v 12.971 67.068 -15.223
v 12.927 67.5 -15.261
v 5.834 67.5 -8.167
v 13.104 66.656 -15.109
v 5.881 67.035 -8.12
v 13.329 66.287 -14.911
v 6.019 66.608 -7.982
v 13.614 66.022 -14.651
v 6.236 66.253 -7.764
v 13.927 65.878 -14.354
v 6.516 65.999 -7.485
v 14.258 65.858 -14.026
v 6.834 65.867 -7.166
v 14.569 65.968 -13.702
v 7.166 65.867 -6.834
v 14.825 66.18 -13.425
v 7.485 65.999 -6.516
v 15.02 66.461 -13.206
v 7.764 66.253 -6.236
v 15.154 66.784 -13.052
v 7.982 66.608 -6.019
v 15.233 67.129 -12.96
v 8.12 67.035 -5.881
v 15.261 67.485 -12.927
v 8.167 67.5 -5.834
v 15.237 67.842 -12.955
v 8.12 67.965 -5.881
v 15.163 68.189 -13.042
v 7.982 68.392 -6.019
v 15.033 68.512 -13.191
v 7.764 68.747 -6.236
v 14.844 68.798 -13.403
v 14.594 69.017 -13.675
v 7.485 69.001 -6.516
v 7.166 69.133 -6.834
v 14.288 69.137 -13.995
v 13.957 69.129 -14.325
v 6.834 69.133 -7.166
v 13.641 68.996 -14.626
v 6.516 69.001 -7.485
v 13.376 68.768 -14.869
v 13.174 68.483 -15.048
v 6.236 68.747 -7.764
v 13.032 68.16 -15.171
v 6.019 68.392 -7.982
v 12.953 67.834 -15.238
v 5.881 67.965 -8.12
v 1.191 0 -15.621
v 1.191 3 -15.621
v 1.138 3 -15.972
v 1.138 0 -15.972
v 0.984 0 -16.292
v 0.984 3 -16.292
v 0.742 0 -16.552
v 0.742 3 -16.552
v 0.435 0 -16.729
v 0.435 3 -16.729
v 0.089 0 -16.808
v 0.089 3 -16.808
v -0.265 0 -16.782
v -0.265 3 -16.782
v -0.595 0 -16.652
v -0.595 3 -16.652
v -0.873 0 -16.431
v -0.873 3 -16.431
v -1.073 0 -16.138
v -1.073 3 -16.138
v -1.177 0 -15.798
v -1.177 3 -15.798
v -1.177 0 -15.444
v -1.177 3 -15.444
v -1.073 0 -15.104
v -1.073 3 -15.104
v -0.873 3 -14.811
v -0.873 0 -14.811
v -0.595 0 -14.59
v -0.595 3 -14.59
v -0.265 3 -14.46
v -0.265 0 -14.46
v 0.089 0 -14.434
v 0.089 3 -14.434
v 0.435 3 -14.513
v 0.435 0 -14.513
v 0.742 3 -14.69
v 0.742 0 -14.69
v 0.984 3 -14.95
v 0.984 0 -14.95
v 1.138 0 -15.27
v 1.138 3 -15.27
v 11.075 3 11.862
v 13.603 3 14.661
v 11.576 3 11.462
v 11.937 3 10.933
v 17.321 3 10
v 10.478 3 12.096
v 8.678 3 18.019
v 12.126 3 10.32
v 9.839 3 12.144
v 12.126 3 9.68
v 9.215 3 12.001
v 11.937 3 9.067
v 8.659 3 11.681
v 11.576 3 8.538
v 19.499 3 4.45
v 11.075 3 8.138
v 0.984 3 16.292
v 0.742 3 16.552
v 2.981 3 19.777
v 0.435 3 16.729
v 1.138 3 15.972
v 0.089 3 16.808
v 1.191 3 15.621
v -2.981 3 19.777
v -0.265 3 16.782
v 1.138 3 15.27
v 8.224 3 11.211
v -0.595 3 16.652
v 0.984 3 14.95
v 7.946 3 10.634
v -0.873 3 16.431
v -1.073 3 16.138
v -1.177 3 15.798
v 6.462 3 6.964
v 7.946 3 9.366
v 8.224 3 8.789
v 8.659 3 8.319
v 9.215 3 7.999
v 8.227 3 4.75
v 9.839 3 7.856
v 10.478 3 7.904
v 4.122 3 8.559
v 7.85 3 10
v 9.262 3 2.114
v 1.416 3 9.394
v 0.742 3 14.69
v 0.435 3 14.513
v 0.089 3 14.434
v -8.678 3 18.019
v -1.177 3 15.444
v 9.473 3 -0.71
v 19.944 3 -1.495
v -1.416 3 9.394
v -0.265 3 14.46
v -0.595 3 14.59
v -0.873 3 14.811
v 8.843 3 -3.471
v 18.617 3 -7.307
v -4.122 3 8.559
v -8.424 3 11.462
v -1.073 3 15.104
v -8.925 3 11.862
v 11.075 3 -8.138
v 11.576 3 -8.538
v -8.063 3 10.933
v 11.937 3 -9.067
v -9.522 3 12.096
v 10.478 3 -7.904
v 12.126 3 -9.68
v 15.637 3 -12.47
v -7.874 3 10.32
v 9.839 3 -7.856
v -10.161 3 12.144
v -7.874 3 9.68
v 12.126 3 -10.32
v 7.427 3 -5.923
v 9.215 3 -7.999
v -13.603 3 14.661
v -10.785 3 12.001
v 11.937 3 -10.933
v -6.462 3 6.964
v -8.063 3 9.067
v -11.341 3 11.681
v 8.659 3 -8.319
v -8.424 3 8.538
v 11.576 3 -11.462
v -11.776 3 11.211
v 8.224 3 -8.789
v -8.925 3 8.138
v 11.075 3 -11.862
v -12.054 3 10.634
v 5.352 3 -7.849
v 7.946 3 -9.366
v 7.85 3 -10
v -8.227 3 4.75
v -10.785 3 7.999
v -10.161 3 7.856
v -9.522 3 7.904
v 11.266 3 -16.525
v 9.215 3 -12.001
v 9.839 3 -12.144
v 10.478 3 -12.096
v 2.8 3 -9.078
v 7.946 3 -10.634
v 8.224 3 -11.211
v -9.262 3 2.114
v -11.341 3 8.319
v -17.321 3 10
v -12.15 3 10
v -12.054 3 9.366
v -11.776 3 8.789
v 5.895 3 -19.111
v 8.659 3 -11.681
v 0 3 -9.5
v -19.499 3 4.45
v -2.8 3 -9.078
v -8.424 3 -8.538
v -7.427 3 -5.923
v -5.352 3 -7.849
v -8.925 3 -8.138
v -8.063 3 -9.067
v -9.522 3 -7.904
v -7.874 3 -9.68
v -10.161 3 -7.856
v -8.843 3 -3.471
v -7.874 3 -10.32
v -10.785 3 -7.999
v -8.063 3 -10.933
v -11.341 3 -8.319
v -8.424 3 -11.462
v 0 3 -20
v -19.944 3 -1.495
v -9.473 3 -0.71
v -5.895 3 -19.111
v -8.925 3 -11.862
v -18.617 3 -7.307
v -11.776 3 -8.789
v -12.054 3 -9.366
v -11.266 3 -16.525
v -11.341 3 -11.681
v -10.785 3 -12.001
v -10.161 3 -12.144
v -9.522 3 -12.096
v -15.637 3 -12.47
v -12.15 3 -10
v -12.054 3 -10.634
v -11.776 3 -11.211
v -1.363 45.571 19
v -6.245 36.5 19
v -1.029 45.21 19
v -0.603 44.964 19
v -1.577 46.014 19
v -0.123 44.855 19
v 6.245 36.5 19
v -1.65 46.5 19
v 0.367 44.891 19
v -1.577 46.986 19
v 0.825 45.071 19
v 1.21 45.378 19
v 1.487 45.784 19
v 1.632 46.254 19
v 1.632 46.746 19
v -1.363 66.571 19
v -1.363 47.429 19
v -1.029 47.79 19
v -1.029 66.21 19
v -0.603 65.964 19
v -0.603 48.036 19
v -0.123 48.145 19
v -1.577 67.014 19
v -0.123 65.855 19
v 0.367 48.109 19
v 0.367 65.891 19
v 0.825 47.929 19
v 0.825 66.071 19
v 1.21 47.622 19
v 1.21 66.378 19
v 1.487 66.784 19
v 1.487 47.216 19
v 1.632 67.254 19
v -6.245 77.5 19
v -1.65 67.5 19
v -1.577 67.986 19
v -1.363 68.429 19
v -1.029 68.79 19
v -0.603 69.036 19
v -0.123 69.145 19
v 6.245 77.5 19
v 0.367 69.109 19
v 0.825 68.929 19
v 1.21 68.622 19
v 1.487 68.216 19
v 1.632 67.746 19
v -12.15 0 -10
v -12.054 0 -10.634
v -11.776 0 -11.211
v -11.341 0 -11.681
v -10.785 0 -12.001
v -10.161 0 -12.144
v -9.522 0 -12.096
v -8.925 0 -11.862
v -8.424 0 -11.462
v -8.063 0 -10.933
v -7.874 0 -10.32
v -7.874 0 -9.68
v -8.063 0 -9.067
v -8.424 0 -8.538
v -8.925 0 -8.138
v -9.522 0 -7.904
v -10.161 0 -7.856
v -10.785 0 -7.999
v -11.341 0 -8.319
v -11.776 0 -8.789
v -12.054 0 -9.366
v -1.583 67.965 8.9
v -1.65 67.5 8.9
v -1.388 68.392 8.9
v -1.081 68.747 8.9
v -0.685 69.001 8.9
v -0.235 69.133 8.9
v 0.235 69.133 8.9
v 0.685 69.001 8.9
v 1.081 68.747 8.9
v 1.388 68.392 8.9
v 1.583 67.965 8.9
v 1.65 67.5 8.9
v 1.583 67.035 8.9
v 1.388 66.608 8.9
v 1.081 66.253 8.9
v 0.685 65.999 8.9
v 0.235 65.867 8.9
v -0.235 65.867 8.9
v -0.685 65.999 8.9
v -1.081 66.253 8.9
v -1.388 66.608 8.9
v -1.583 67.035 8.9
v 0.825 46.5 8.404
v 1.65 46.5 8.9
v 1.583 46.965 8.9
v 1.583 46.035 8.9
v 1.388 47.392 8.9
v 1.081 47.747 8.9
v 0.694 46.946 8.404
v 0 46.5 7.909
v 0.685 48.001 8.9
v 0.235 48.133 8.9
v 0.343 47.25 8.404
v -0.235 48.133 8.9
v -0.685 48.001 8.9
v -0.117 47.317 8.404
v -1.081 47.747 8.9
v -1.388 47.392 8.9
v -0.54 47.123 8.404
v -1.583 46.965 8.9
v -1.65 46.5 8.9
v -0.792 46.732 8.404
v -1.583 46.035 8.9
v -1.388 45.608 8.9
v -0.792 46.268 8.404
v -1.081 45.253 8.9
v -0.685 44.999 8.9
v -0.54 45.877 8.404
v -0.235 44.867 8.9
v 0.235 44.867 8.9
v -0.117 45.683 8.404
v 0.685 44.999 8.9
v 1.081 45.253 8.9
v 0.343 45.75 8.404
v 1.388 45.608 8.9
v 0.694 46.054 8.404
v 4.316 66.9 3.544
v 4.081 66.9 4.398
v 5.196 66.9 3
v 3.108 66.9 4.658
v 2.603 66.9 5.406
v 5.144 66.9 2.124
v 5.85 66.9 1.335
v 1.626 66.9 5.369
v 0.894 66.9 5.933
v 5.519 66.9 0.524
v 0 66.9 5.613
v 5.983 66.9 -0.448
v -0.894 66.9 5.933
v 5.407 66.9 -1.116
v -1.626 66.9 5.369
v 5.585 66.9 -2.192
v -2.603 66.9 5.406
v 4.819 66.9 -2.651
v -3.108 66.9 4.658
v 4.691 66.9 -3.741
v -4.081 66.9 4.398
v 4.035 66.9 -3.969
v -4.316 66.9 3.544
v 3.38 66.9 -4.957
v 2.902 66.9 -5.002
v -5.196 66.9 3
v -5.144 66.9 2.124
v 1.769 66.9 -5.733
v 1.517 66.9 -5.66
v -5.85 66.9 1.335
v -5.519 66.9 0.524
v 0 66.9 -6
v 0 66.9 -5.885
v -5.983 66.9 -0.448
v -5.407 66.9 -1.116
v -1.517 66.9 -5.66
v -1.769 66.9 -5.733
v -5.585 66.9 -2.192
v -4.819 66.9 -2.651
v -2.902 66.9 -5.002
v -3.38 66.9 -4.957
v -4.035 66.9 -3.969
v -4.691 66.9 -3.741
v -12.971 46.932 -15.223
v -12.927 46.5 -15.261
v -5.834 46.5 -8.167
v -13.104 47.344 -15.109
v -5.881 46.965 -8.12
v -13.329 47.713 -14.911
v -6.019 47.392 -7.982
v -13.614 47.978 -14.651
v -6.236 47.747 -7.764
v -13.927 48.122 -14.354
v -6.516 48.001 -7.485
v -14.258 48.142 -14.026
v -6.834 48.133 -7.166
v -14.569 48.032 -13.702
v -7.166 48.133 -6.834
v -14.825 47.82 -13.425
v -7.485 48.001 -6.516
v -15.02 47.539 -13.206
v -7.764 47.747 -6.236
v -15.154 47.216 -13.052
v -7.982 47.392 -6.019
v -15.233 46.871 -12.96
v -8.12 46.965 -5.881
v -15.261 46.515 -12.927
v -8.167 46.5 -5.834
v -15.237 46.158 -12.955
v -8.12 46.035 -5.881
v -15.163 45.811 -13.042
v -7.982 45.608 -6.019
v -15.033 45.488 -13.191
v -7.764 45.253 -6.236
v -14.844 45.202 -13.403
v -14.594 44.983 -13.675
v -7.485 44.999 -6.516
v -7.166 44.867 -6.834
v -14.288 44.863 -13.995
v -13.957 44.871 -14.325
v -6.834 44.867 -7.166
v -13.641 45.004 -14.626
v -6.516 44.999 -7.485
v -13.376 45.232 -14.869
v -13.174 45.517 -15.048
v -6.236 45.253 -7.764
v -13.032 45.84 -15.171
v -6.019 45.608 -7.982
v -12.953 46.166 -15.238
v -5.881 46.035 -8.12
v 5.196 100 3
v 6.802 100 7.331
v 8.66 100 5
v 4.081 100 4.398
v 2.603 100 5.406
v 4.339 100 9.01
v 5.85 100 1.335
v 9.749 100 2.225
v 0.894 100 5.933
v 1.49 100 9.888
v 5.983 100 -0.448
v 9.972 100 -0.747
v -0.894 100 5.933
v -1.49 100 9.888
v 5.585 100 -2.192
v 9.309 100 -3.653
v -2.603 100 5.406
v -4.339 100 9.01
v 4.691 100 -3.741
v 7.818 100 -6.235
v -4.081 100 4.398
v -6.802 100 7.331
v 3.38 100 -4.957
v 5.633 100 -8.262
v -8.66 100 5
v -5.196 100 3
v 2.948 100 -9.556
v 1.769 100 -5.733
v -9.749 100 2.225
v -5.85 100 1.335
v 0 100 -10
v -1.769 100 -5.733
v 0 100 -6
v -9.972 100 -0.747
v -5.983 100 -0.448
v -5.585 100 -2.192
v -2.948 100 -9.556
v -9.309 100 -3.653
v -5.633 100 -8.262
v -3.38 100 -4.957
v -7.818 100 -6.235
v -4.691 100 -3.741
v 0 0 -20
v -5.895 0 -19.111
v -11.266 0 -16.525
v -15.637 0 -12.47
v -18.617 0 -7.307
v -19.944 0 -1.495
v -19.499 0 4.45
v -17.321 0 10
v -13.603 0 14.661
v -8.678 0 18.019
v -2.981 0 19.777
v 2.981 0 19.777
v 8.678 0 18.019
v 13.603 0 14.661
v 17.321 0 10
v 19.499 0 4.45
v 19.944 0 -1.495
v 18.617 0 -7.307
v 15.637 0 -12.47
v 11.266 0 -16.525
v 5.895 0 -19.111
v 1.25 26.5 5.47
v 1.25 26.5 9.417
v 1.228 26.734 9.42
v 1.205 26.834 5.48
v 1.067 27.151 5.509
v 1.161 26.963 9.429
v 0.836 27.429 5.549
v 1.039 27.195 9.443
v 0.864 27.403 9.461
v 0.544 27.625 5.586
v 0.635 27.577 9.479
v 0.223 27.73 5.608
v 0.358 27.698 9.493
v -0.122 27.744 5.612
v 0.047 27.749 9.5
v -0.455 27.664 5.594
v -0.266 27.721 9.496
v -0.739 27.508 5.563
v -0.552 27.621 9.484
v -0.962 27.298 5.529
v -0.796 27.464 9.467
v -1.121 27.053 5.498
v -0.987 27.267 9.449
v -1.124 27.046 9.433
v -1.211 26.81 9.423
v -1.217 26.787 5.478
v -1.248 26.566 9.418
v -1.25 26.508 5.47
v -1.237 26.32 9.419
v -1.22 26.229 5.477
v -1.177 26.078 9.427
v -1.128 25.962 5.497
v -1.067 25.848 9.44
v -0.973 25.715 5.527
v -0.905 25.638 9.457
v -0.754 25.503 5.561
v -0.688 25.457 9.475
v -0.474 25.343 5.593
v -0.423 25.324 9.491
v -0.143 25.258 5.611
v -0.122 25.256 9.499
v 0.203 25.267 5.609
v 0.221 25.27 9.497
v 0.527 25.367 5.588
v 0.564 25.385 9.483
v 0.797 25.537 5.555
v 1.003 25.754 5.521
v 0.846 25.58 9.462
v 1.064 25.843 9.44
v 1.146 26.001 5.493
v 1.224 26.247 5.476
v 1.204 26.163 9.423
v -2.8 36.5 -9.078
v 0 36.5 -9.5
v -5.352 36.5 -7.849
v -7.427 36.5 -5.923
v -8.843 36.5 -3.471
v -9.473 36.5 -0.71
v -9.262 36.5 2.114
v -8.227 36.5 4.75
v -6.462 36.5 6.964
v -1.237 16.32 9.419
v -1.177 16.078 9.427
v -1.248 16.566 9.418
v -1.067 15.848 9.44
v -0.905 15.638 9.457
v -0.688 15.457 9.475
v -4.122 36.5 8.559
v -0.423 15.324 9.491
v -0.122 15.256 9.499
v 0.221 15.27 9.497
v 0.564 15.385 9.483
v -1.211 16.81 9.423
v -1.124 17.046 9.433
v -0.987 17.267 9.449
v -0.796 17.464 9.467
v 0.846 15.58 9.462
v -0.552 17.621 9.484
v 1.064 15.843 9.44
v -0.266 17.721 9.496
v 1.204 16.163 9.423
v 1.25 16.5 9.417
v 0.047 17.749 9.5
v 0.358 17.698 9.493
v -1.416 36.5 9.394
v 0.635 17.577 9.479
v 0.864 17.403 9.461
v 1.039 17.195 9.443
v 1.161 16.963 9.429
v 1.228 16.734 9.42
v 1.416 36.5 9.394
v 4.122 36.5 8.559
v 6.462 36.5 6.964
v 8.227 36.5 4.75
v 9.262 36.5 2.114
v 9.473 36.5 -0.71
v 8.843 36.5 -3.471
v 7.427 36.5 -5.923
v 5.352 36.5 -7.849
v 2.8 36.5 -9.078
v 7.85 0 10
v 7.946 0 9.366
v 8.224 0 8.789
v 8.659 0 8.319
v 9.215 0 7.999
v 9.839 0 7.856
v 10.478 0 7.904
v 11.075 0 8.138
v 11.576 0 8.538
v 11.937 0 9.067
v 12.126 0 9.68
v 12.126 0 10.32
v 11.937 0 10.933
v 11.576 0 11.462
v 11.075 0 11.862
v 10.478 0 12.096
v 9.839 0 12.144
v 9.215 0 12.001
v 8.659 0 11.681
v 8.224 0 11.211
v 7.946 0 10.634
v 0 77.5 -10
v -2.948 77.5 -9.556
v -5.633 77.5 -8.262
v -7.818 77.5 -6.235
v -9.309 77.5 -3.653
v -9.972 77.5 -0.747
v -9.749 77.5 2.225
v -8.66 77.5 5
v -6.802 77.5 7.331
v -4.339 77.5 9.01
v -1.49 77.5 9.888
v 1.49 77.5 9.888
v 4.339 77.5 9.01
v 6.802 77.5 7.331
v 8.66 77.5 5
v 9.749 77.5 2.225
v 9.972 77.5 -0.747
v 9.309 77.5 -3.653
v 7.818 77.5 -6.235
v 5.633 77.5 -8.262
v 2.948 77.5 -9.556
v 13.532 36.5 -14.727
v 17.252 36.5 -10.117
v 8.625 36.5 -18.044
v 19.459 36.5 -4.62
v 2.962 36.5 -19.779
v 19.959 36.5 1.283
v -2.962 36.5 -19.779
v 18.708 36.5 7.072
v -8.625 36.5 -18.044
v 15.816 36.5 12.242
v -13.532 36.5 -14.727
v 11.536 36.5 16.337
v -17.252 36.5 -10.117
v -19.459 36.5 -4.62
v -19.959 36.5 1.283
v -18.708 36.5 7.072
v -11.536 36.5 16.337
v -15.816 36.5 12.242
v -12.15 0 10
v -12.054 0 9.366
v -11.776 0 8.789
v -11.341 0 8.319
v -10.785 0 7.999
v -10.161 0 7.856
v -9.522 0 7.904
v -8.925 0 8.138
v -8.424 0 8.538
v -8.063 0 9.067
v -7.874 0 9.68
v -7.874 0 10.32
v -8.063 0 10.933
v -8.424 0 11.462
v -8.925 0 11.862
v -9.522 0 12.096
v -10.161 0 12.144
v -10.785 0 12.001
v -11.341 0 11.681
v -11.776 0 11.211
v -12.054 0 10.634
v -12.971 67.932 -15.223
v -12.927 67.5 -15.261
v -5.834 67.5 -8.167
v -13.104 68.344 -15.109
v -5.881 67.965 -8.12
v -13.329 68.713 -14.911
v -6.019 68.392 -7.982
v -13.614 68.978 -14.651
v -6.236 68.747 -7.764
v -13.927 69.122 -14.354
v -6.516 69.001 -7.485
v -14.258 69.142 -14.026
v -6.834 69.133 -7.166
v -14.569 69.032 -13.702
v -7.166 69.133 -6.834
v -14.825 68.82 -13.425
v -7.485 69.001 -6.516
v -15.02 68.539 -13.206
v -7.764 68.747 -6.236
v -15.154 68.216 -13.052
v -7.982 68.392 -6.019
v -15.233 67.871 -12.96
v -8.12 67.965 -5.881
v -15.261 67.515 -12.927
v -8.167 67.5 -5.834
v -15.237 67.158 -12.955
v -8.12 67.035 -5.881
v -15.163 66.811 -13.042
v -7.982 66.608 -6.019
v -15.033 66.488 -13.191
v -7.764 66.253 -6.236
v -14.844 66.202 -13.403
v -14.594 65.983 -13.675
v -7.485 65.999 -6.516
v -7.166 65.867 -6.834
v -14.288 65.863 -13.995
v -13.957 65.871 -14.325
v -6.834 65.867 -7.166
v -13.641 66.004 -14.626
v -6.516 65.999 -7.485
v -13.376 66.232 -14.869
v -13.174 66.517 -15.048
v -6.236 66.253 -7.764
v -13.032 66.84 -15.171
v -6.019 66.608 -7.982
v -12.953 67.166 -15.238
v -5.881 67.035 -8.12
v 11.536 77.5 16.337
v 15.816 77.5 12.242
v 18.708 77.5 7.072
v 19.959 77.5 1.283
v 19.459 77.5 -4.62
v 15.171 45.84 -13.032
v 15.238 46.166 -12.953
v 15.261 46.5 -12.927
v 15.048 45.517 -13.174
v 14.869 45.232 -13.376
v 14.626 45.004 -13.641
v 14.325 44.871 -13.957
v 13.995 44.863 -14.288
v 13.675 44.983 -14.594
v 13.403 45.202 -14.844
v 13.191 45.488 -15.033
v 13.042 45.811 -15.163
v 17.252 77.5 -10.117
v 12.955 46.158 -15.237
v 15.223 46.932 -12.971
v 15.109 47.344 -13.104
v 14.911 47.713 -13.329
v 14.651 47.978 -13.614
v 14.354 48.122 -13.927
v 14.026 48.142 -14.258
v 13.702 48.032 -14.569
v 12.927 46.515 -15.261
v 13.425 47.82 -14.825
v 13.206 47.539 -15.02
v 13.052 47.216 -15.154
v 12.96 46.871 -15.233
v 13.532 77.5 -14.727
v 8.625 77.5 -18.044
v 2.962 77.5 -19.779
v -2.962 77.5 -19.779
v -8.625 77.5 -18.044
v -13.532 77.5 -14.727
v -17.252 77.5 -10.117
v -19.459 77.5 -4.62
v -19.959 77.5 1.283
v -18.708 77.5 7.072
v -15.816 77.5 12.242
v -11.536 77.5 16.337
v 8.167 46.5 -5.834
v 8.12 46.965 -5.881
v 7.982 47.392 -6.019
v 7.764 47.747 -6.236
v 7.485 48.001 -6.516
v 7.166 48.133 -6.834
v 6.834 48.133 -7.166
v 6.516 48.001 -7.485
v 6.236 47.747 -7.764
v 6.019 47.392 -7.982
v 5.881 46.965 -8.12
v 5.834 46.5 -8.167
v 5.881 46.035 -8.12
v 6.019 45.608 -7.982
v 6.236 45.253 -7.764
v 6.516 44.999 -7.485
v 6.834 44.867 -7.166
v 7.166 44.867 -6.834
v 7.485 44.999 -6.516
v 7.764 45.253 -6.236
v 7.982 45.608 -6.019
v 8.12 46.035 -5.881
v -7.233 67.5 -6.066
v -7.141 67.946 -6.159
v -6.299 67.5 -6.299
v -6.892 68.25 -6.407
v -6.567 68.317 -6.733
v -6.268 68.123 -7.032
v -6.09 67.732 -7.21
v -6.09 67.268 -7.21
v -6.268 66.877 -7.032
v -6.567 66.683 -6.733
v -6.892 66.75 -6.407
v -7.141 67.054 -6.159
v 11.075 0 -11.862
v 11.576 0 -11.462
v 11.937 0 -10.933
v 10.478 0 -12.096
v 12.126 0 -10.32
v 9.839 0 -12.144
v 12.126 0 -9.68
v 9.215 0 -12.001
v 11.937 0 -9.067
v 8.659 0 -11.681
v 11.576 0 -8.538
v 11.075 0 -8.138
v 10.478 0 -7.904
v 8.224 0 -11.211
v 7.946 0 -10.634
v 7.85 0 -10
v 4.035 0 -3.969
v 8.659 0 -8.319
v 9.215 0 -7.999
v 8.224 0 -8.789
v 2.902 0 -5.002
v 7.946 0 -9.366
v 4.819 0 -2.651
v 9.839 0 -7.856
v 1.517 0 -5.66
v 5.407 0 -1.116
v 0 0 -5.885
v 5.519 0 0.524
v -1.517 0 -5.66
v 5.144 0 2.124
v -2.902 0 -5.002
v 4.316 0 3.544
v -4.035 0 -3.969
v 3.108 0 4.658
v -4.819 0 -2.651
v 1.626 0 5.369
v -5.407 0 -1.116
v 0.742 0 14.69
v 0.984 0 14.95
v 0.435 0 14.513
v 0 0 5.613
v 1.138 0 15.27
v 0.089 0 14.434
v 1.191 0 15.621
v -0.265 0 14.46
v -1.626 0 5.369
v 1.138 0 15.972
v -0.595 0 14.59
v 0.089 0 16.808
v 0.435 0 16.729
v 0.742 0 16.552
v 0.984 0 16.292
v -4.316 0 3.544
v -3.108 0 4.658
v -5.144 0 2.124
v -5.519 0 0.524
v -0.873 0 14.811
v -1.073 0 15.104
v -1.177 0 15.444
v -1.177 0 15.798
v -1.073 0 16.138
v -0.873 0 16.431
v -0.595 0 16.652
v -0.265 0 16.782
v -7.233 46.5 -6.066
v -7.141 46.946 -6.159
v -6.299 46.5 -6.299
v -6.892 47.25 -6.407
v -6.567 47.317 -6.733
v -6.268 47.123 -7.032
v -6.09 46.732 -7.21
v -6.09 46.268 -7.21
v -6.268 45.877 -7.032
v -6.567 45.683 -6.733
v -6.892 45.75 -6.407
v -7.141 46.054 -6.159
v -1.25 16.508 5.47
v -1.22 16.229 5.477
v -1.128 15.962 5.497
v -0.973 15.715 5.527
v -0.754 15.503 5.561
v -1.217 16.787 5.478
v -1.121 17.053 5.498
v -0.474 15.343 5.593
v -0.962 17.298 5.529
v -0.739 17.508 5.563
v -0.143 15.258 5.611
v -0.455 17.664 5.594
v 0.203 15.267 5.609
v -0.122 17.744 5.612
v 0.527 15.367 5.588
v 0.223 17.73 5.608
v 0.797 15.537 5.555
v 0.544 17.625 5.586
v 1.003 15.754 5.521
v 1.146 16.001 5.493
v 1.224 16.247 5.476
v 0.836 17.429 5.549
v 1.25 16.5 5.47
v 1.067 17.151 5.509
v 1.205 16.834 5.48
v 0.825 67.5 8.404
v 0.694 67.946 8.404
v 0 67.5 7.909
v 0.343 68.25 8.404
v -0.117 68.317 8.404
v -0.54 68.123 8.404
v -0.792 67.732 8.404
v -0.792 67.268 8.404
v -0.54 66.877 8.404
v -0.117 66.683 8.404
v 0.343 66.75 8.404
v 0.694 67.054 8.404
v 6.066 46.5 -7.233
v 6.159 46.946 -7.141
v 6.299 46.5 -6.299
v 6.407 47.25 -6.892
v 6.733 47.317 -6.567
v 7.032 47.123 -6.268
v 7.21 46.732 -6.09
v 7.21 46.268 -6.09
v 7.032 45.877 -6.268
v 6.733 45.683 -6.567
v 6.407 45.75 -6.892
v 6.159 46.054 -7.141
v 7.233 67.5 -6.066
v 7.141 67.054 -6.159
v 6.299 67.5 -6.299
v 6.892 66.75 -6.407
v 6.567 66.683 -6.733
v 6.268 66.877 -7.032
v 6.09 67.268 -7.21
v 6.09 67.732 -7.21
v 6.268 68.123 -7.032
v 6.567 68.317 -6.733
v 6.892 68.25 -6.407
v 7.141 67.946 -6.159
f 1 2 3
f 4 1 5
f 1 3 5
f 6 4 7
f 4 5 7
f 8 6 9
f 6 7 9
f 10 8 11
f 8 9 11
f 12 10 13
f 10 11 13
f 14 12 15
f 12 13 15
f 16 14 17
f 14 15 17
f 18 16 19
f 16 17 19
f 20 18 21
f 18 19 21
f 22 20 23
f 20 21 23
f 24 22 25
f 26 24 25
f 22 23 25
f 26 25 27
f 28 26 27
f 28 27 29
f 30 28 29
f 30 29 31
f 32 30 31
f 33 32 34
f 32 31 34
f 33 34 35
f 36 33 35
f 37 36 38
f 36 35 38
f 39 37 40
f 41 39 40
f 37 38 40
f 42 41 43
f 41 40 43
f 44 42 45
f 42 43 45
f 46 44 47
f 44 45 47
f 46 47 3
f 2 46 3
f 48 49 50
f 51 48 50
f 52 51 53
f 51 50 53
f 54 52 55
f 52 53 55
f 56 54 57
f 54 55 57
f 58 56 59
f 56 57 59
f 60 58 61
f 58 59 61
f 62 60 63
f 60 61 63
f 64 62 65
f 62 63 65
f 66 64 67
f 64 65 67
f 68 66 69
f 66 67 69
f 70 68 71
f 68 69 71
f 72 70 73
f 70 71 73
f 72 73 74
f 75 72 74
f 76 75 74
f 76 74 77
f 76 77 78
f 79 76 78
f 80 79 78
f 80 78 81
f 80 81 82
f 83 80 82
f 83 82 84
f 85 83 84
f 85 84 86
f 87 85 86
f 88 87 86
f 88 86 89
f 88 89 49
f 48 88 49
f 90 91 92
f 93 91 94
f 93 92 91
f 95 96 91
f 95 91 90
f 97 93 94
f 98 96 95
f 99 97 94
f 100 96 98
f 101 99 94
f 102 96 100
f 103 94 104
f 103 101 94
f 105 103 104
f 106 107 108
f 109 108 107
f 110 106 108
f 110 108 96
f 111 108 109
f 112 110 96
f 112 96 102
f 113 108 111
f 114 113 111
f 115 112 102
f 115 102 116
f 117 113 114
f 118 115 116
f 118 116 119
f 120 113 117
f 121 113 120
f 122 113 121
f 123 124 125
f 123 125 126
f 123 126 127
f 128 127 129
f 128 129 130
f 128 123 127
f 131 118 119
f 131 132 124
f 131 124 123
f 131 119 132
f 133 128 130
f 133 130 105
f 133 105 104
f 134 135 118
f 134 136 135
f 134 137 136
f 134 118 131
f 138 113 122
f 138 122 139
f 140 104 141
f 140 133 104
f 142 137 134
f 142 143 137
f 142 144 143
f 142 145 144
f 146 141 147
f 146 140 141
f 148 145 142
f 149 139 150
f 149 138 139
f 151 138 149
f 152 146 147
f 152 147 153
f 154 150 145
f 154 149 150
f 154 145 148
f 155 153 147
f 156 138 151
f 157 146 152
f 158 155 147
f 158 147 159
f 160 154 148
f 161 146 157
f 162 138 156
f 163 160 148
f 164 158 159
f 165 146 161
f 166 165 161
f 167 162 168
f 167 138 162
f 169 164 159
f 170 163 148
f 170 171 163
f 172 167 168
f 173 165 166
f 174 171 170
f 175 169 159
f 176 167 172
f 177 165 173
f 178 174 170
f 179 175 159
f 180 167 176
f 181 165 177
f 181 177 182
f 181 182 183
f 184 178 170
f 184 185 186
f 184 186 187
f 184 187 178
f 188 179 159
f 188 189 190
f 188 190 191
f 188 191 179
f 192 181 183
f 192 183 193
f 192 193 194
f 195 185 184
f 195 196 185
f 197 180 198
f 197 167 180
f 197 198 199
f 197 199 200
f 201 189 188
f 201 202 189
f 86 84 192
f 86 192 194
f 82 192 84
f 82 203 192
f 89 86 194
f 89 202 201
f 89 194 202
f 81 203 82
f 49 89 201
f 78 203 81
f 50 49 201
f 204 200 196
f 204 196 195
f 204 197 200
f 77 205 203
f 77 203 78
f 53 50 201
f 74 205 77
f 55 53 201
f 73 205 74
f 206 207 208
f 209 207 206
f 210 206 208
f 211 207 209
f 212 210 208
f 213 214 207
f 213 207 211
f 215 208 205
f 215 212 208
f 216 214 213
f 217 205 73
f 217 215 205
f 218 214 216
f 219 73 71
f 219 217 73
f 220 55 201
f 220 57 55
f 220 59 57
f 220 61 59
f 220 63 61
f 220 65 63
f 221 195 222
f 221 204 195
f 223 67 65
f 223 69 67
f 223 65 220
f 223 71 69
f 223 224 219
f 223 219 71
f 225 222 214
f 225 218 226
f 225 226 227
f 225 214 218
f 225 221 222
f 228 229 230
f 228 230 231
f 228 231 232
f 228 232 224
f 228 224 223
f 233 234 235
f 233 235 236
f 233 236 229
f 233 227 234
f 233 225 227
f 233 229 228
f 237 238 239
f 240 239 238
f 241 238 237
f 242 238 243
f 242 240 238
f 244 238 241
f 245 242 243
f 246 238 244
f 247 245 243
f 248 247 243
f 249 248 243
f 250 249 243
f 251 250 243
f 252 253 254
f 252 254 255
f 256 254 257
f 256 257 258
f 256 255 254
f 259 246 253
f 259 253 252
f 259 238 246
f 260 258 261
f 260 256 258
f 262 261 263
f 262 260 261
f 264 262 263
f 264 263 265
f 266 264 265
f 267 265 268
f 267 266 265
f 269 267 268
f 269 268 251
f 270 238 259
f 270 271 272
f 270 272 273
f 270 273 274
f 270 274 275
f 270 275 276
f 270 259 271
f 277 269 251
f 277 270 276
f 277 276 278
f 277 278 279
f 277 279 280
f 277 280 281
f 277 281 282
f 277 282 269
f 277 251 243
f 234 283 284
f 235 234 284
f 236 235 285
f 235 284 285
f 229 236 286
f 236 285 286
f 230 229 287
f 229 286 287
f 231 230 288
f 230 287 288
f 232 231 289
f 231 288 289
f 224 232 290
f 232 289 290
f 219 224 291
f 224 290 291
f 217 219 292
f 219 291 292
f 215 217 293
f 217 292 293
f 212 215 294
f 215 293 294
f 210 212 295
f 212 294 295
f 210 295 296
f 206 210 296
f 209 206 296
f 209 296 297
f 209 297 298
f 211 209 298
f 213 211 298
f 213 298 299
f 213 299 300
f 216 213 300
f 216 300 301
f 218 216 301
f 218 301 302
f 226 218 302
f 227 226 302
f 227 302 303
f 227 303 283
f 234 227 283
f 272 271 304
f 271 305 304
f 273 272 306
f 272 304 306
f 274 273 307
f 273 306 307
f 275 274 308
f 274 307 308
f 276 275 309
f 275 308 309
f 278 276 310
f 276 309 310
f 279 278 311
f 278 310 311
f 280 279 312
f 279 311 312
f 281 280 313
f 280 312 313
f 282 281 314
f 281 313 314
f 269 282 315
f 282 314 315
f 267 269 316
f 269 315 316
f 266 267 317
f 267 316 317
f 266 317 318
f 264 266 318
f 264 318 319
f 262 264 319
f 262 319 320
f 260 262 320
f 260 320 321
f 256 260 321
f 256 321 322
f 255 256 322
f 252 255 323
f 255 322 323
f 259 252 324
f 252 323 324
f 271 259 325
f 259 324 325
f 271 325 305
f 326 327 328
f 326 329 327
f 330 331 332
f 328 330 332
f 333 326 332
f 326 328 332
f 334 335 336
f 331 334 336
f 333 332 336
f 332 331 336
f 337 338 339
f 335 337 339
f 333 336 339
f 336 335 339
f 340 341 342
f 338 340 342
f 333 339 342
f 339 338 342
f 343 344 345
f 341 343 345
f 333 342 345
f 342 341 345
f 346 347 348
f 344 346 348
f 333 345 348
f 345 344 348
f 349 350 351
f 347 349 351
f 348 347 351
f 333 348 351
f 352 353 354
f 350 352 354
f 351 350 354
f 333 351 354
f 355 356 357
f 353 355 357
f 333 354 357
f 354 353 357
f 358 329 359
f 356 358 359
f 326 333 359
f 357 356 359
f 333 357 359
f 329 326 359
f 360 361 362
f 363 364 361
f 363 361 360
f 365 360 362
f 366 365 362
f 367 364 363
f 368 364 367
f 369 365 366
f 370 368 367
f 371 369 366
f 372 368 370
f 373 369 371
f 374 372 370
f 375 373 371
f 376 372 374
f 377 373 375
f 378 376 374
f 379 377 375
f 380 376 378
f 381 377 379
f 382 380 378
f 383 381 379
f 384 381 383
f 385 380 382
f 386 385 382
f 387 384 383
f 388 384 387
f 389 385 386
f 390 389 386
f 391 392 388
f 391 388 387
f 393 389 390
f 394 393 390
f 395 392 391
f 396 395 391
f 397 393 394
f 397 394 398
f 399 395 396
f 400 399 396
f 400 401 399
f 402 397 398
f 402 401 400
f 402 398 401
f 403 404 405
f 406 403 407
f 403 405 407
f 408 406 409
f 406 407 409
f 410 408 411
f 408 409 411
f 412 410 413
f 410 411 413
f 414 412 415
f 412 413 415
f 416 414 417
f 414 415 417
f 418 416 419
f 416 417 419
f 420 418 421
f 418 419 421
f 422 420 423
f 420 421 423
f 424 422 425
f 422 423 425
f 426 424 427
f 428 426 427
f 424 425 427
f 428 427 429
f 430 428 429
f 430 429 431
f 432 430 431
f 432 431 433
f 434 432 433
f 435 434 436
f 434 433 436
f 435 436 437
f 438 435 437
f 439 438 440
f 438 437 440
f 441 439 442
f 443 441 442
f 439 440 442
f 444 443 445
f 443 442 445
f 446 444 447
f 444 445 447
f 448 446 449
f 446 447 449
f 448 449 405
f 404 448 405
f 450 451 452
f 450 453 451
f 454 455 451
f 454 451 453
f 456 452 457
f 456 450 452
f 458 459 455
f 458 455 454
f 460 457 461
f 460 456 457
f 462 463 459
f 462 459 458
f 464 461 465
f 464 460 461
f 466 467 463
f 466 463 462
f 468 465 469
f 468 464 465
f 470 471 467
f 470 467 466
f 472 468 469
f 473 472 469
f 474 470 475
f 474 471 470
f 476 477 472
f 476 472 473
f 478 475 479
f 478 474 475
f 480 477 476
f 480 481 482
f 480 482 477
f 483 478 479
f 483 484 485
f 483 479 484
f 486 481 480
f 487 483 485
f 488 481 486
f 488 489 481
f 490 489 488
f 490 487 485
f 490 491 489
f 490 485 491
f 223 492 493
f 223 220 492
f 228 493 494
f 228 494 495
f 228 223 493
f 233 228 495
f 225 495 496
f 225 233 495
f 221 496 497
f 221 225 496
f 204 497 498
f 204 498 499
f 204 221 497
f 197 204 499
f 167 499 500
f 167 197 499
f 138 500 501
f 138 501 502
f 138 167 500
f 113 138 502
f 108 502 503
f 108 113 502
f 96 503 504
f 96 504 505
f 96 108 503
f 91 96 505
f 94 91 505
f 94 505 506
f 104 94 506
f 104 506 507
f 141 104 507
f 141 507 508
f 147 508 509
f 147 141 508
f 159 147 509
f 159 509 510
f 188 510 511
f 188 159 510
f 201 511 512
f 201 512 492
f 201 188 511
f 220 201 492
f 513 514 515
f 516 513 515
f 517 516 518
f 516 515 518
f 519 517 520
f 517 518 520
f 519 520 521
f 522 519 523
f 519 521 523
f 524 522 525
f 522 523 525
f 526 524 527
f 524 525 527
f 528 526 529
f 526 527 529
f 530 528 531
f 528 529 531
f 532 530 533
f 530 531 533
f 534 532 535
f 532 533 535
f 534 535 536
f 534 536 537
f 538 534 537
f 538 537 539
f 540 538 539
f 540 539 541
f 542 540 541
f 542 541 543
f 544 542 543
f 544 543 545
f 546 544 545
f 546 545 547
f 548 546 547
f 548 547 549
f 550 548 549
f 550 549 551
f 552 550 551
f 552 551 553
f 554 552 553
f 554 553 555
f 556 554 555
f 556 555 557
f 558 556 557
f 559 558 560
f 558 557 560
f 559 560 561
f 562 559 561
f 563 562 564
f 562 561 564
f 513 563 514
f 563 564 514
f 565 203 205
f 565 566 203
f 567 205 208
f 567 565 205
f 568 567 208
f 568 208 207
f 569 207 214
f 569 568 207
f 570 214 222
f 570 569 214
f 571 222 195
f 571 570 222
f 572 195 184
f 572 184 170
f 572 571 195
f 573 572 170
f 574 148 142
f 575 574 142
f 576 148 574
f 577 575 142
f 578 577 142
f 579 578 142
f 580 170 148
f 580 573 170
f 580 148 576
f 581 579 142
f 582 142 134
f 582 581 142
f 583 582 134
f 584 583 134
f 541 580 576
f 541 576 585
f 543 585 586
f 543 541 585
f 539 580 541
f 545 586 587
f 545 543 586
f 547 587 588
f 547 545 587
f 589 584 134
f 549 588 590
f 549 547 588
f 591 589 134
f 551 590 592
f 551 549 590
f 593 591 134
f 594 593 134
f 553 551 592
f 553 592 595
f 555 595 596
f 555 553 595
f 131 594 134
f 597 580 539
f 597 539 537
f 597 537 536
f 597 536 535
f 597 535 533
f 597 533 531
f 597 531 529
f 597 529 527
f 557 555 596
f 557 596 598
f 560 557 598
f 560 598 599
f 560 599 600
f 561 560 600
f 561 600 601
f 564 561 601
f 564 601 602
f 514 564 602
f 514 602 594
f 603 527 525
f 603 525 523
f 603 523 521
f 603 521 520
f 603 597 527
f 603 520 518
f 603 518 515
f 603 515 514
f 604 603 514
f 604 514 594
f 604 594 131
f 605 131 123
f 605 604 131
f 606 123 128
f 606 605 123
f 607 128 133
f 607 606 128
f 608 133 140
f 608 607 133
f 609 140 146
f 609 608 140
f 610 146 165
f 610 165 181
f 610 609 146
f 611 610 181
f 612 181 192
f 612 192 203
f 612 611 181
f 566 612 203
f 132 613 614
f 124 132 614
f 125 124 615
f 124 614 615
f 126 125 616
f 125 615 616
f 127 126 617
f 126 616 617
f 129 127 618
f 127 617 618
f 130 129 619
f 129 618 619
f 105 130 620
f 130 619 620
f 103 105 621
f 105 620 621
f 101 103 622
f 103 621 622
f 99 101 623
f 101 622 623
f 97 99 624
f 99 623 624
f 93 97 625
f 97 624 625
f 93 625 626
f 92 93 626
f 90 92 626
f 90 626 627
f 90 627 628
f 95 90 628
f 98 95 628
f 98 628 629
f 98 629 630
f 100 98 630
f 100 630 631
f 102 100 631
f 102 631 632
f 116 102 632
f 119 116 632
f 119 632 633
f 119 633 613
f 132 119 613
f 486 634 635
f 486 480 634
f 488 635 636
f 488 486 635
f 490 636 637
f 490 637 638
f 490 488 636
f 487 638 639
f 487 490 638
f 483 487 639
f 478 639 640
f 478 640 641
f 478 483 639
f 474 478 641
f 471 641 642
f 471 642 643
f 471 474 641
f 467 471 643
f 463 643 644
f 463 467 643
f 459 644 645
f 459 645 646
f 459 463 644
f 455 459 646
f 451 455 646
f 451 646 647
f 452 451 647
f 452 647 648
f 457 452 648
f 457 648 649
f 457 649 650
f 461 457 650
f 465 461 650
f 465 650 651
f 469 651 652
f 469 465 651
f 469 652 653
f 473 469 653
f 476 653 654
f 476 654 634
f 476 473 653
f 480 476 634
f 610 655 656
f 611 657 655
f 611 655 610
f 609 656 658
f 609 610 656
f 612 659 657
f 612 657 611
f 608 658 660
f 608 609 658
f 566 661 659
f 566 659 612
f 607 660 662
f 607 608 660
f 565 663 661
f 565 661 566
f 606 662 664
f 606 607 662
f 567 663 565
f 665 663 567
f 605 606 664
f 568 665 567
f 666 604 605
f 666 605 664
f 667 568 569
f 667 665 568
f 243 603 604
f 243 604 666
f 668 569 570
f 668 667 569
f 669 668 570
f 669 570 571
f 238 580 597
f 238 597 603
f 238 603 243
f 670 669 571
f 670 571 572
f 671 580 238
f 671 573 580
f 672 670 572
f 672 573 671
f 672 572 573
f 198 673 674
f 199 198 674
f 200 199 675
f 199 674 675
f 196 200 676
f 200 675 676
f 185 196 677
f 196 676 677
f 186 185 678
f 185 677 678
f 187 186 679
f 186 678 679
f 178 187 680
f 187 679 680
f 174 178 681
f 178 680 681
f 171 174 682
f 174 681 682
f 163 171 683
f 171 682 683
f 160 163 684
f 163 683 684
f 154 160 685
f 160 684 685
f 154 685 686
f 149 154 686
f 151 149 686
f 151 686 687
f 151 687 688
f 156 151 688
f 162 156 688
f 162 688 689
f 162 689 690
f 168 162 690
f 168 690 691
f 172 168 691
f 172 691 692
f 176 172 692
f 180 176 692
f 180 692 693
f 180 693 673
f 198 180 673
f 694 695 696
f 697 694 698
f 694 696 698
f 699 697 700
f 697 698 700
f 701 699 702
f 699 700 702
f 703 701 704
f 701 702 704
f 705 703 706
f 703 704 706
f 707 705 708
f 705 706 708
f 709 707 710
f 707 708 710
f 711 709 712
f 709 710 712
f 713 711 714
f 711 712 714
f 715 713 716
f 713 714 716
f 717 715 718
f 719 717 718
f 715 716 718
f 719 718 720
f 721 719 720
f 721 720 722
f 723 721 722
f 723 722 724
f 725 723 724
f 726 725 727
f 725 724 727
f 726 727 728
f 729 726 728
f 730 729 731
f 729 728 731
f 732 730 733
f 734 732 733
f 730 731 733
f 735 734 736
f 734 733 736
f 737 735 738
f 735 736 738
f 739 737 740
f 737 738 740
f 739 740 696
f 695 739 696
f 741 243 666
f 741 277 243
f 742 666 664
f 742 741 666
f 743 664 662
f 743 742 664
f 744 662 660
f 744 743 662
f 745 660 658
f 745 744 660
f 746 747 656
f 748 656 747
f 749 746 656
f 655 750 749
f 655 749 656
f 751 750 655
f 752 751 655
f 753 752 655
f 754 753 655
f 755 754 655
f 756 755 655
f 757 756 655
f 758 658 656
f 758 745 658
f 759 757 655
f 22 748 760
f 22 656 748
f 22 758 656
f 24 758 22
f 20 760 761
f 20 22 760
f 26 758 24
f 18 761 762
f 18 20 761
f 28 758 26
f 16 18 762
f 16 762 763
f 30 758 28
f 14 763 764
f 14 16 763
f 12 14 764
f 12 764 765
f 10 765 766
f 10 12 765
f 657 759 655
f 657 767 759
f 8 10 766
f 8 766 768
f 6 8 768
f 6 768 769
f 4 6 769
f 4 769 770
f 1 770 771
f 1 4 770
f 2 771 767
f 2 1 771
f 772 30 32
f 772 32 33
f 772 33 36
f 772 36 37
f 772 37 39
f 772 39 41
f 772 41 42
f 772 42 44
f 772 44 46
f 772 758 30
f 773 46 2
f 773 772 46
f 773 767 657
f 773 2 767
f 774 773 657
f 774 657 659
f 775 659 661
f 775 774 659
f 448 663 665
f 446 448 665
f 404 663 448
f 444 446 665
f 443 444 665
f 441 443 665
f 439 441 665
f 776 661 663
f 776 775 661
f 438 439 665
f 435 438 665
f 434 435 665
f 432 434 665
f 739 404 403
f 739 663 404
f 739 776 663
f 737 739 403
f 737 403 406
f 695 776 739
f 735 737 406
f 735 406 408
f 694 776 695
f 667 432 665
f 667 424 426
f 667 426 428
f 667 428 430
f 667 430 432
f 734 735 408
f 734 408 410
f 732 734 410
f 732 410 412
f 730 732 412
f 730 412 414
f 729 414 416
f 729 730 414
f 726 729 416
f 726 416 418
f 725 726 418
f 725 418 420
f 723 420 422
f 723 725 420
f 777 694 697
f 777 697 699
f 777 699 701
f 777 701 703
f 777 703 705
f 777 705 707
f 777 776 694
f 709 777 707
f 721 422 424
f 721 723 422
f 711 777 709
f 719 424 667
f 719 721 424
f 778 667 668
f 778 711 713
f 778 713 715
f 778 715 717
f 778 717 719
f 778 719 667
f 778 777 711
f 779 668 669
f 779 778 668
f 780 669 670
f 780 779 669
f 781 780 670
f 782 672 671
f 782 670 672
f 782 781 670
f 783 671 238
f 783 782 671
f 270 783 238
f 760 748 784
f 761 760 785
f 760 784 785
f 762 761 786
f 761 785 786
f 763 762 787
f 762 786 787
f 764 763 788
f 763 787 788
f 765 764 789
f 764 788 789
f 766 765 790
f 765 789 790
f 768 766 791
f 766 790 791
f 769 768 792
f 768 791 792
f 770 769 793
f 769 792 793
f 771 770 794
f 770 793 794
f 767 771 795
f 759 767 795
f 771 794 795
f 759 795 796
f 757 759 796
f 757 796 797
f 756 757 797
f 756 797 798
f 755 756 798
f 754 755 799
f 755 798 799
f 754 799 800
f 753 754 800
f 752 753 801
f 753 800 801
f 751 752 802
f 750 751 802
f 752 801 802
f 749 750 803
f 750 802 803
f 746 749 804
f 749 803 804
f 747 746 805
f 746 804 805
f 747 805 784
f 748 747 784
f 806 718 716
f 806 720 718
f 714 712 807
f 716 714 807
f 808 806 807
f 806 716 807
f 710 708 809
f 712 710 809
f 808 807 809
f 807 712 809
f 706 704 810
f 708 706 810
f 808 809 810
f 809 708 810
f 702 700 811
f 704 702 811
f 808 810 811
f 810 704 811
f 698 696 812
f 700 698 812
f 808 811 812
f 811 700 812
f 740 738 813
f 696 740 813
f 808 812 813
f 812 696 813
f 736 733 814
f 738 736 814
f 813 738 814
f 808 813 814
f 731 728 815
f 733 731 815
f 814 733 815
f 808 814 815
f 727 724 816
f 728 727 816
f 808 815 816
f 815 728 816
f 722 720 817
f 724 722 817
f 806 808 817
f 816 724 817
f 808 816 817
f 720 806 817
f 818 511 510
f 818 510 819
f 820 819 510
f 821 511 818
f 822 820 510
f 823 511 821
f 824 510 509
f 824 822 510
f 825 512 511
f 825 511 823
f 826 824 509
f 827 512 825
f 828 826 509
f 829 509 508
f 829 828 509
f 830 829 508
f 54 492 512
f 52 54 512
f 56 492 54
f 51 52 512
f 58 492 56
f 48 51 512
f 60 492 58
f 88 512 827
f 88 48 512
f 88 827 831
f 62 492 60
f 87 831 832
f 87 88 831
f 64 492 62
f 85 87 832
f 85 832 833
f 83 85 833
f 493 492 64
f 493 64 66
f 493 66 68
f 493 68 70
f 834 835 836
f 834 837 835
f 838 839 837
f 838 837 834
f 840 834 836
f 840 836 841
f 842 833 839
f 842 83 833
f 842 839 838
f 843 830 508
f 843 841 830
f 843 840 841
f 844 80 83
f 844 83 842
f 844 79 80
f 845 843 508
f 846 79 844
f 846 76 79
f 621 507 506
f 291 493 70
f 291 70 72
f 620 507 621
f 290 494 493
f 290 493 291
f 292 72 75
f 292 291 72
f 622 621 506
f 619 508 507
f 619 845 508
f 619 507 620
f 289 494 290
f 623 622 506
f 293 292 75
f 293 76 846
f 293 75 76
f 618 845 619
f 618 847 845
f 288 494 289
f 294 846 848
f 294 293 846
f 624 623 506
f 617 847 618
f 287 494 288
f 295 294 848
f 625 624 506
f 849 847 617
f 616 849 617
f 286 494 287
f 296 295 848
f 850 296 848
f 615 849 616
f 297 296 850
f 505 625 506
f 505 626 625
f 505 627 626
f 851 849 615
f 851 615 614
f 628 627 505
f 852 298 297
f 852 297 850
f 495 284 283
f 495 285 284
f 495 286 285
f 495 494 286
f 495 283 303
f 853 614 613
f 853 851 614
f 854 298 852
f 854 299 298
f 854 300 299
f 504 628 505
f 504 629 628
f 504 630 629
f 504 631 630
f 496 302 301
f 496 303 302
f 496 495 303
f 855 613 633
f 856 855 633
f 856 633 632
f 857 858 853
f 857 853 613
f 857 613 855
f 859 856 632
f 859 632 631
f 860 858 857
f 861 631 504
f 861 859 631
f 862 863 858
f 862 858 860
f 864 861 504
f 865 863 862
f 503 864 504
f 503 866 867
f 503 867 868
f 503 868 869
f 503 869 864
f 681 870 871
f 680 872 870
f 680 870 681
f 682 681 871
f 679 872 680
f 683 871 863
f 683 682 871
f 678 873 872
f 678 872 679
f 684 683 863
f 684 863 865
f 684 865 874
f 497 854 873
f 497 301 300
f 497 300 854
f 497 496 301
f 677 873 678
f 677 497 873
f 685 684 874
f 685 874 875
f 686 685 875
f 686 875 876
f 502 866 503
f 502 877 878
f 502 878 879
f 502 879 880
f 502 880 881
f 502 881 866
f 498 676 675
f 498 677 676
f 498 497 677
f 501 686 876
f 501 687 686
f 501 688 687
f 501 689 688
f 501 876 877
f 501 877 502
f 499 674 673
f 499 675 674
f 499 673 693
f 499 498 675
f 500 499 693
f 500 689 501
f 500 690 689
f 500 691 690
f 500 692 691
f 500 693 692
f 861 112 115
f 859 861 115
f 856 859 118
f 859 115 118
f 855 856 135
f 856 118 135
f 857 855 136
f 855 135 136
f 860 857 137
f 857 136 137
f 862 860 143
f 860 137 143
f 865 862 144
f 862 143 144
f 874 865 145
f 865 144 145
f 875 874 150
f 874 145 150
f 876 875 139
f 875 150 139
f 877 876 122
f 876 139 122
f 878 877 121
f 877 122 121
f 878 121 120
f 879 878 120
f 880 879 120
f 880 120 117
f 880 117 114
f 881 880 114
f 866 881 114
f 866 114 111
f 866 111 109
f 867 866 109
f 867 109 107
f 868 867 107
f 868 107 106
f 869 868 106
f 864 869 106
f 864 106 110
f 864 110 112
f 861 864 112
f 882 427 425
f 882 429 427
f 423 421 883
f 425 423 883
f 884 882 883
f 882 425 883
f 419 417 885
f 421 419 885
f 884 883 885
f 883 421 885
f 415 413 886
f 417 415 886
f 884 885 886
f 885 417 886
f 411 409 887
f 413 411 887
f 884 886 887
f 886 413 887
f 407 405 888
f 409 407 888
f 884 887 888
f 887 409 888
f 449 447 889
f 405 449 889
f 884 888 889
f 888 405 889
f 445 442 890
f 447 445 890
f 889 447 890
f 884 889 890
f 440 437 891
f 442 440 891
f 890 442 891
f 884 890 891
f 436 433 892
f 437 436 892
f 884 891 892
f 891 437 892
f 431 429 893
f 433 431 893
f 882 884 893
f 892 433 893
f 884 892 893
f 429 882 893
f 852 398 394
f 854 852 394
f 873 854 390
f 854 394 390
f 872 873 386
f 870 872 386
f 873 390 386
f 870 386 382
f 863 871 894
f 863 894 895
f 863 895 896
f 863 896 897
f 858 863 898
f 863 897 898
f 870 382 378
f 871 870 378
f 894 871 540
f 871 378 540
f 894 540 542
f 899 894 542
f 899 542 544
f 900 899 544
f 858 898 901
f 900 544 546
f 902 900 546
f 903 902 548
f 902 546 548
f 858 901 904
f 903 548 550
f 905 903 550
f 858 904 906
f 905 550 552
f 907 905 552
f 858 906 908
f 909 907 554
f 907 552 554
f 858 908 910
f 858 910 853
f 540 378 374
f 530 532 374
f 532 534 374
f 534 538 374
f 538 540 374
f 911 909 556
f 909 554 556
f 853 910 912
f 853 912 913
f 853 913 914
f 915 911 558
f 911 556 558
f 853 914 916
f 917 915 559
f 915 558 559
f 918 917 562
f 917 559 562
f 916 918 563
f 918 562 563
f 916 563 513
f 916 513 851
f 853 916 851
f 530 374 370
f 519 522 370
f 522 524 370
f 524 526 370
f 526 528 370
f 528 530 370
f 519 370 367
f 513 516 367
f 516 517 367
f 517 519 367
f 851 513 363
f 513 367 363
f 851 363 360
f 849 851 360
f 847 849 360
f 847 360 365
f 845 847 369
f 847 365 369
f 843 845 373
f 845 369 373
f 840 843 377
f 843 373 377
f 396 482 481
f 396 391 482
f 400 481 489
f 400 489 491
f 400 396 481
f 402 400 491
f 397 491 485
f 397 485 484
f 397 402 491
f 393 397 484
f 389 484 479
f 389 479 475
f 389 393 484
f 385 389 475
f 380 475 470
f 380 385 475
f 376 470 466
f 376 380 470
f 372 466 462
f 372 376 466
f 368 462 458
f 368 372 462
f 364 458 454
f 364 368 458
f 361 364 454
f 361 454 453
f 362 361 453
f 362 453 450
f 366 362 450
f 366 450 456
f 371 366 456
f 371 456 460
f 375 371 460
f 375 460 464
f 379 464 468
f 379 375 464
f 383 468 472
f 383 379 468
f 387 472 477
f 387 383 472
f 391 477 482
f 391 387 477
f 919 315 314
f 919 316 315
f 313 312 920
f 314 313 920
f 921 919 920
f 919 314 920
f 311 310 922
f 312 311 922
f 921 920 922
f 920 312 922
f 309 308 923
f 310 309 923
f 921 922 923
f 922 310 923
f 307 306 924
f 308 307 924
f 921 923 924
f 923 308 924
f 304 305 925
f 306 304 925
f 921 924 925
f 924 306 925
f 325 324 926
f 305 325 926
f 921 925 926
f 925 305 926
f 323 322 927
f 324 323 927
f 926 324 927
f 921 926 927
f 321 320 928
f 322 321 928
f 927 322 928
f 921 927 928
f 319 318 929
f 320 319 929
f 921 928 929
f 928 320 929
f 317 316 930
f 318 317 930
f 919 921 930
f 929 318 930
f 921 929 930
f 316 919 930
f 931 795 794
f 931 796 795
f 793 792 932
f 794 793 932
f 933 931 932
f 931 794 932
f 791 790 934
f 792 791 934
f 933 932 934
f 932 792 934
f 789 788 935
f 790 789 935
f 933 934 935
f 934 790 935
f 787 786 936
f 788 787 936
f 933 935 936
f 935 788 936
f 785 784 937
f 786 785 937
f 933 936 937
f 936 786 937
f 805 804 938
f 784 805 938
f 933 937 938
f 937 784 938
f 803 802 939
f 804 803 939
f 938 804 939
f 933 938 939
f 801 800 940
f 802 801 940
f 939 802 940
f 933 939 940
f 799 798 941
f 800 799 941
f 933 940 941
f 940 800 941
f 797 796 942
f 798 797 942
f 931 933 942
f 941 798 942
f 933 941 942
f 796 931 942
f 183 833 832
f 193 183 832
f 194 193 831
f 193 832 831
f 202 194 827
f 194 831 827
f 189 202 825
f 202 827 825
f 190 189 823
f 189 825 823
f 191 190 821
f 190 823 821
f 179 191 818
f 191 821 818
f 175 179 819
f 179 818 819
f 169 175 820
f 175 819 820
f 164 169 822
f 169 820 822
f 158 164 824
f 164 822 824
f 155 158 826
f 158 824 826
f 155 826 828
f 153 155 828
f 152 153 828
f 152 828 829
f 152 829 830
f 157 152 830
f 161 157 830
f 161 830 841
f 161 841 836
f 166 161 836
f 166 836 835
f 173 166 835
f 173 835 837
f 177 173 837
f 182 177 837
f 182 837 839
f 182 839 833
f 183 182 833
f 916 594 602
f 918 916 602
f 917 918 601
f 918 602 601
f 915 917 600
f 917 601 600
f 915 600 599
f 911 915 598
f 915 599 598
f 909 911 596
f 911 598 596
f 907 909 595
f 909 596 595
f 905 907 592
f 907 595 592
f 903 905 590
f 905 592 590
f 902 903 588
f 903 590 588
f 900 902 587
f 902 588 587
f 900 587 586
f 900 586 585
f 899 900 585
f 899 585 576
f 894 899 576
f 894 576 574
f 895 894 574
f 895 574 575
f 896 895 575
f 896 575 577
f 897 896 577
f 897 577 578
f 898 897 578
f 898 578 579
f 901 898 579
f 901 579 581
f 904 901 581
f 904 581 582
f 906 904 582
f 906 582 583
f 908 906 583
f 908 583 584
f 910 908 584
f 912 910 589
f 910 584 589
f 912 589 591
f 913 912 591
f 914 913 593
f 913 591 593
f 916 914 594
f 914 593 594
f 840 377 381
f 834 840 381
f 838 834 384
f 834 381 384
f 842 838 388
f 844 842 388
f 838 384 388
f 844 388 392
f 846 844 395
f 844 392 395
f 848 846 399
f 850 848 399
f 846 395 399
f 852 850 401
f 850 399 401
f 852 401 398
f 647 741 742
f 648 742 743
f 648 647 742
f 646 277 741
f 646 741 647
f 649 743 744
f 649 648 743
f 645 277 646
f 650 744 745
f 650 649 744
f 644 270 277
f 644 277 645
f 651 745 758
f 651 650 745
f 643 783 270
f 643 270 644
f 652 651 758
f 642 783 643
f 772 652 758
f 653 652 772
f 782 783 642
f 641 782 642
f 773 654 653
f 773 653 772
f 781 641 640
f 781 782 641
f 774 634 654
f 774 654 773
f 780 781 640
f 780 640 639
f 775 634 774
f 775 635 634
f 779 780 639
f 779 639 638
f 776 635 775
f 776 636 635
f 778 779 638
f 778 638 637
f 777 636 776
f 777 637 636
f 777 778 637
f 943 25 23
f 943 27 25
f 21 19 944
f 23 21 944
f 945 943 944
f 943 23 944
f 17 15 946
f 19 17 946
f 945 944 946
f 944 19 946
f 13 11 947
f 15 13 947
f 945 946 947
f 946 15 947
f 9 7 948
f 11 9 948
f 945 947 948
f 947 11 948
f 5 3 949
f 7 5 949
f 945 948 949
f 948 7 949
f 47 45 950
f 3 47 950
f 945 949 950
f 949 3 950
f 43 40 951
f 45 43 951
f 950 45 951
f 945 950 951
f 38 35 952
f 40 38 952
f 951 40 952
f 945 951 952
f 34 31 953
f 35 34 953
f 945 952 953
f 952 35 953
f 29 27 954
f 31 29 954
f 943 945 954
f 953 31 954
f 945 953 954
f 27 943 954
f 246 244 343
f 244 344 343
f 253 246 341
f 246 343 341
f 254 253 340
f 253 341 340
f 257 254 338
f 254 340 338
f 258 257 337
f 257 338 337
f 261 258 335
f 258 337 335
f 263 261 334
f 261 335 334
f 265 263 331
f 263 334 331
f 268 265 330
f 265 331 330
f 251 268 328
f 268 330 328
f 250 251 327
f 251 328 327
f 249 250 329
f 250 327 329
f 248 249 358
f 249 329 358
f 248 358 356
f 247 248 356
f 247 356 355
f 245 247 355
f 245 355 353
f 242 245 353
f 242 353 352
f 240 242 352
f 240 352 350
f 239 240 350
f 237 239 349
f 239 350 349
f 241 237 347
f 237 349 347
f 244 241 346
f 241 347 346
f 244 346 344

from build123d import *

# Parameters (mm, degrees)
CUT_EXTRUDE2_REACH              = 84.5
M4_TAPPED_HOLE1_D               = 3.3
M4_TAPPED_HOLE1_DEPTH           = 10.1
M4_TAPPED_HOLE1_TIP             = 0.991420021
M4_TAPPED_HOLE1_ON_FACE_2_D     = 3.3
M4_TAPPED_HOLE1_ON_FACE_2_DEPTH = 10.1
M4_TAPPED_HOLE1_ON_FACE_2_TIP   = 0.991420021
M4_TAPPED_HOLE1_ON_FACE_3_D     = 3.3
M4_TAPPED_HOLE1_ON_FACE_3_DEPTH = 10.1
M4_TAPPED_HOLE1_ON_FACE_3_TIP   = 0.991420021
M4_TAPPED_HOLE1_ON_FACE_4_D     = 3.3
M4_TAPPED_HOLE1_ON_FACE_4_DEPTH = 10.1
M4_TAPPED_HOLE1_ON_FACE_4_TIP   = 0.991420021
CUT_EXTRUDE1_START              = -66.9
CUT_EXTRUDE1_DEPTH              = 66.9
M3_TAPPED_HOLE1_REACH           = 92.788
M3_TAPPED_HOLE1_BORE_R          = 1.25
F_2_4MM_DOWEL_HOLE1_D           = 2.38125
F_2_4MM_DOWEL_HOLE1_DEPTH       = 3
M4_CLEARANCE_HOLE2_D            = 4.3
M4_CLEARANCE_HOLE2_DEPTH        = 3


with BuildPart() as part:
    # Sketch1 → Revolve1 (revolve)
    with BuildSketch(Plane.XY, mode=Mode.PRIVATE) as revolve1_sk:
        Polygon((5.5, 66.9), (5.5, 0), (20, 0), (20, 3), (9.5, 3), (9.5, 36.5), (20, 36.5), (20, 77.5), (10, 77.5), (10, 100), (6, 100), (6, 66.9), align=None)
    revolve(revolve1_sk.sketch.rotate(Axis((0, 0, 0), (0, 1, 0)), 90), axis=Axis((0, 0, 0), (0, 1, 0)))

    # Sketch6 → Cut-Extrude2 (cut, up to next)
    with BuildSketch(Plane(origin=(0, 77.5, 0), x_dir=(1, 0, 0), z_dir=(0, 1, 0)), mode=Mode.PRIVATE) as cut_extrude2_sk1:
        with BuildLine():
            Line((-6.244997998, -19), (6.244997998, -19))
            ThreePointArc((6.244997998, -19), (0, -20), (-6.244997998, -19))
        make_face()
    cut_extrude2_tool1 = extrude(cut_extrude2_sk1.sketch, amount=-CUT_EXTRUDE2_REACH, mode=Mode.PRIVATE) & part.part
    add(cut_extrude2_tool1.solids().sort_by_distance((0, 77.5, 19.40087))[0], mode=Mode.SUBTRACT)

    # M4 Tapped Hole1
    with Locations(Plane(origin=(14.142135624, 67.5, -14.142135624), x_dir=(0.707106781187, 0, 0.707106781187), z_dir=(0.707106781187, 0, -0.707106781187))):
        with Locations((0, 0)):
            Hole(M4_TAPPED_HOLE1_D / 2, depth=M4_TAPPED_HOLE1_DEPTH)
            with Locations((0, 0, -(M4_TAPPED_HOLE1_DEPTH + M4_TAPPED_HOLE1_TIP / 2))):  # 118° drill point
                Cone(0, M4_TAPPED_HOLE1_D / 2, M4_TAPPED_HOLE1_TIP, mode=Mode.SUBTRACT)

    # M4 Tapped Hole1 on face 2
    with Locations(Plane(origin=(14.142135624, 46.5, -14.142135624), x_dir=(-0.707106781187, 0, -0.707106781187), z_dir=(0.707106781187, 0, -0.707106781187))):
        with Locations((0, 0)):
            Hole(M4_TAPPED_HOLE1_ON_FACE_2_D / 2, depth=M4_TAPPED_HOLE1_ON_FACE_2_DEPTH)
            with Locations((0, 0, -(M4_TAPPED_HOLE1_ON_FACE_2_DEPTH + M4_TAPPED_HOLE1_ON_FACE_2_TIP / 2))):  # 118° drill point
                Cone(0, M4_TAPPED_HOLE1_ON_FACE_2_D / 2, M4_TAPPED_HOLE1_ON_FACE_2_TIP, mode=Mode.SUBTRACT)

    # M4 Tapped Hole1 on face 3
    with Locations(Plane(origin=(-14.142135624, 46.5, -14.142135624), x_dir=(-0.707106781187, 0, 0.707106781187), z_dir=(-0.707106781187, 0, -0.707106781187))):
        with Locations((0, 0), (0, 21)):
            Hole(M4_TAPPED_HOLE1_ON_FACE_3_D / 2, depth=M4_TAPPED_HOLE1_ON_FACE_3_DEPTH)
            with Locations((0, 0, -(M4_TAPPED_HOLE1_ON_FACE_3_DEPTH + M4_TAPPED_HOLE1_ON_FACE_3_TIP / 2))):  # 118° drill point
                Cone(0, M4_TAPPED_HOLE1_ON_FACE_3_D / 2, M4_TAPPED_HOLE1_ON_FACE_3_TIP, mode=Mode.SUBTRACT)

    # M4 Tapped Hole1 on face 4
    with Locations(Plane(origin=(0, 67.5, 19), x_dir=(1, 0, 0), z_dir=(0, 0, 1))):
        with Locations((0, 0), (0, -21)):
            Hole(M4_TAPPED_HOLE1_ON_FACE_4_D / 2, depth=M4_TAPPED_HOLE1_ON_FACE_4_DEPTH)
            with Locations((0, 0, -(M4_TAPPED_HOLE1_ON_FACE_4_DEPTH + M4_TAPPED_HOLE1_ON_FACE_4_TIP / 2))):  # 118° drill point
                Cone(0, M4_TAPPED_HOLE1_ON_FACE_4_D / 2, M4_TAPPED_HOLE1_ON_FACE_4_TIP, mode=Mode.SUBTRACT)

    # Sketch3 → Cut-Extrude1 (cut)
    with BuildSketch(Plane.XZ.offset(CUT_EXTRUDE1_START)):
        with BuildLine():
            ThreePointArc((4.818762467, -2.651325759), (0, -5.885414894), (-4.818762467, -2.651325759))
            ThreePointArc((-4.818762467, -2.651325759), (0, 5.612925106), (4.818762467, -2.651325759))
        make_face()
    extrude(amount=CUT_EXTRUDE1_DEPTH, mode=Mode.SUBTRACT)

    # M3 Tapped Hole1 bore (on position points) → M3 Tapped Hole1 (cut, up to next)
    with BuildSketch(Plane(origin=(0, 16.5, 9.5), x_dir=(1, 0, 0), z_dir=(0, 0, 1)), mode=Mode.PRIVATE) as m3_tapped_hole1_sk1:
        Circle(M3_TAPPED_HOLE1_BORE_R)
    m3_tapped_hole1_tool1 = extrude(m3_tapped_hole1_sk1.sketch, amount=-M3_TAPPED_HOLE1_REACH, mode=Mode.PRIVATE) & part.part
    # M3 Tapped Hole1 bore (on position points) → M3 Tapped Hole1 (cut, up to next)
    with BuildSketch(Plane(origin=(0, 16.5, 9.5), x_dir=(1, 0, 0), z_dir=(0, 0, 1)), mode=Mode.PRIVATE) as m3_tapped_hole1_sk2:
        with Locations((0, 10)):
            Circle(M3_TAPPED_HOLE1_BORE_R)
    m3_tapped_hole1_tool2 = extrude(m3_tapped_hole1_sk2.sketch, amount=-M3_TAPPED_HOLE1_REACH, mode=Mode.PRIVATE) & part.part
    add(m3_tapped_hole1_tool1.solids().sort_by_distance((0, 16.5, 9.5))[0], mode=Mode.SUBTRACT)
    add(m3_tapped_hole1_tool2.solids().sort_by_distance((0, 26.5, 9.5))[0], mode=Mode.SUBTRACT)

    # Ø2.4mm Dowel Hole1
    with Locations(Plane(origin=(0, 0, 0), x_dir=(-1, 0, 0), z_dir=(0, -1, 0))):
        with Locations((0, -15.621), (0, 15.621)):
            Hole(F_2_4MM_DOWEL_HOLE1_D / 2, depth=F_2_4MM_DOWEL_HOLE1_DEPTH)

    # M4 Clearance Hole2
    with Locations(Plane(origin=(0, 3, 0), x_dir=(1, 0, 0), z_dir=(0, 1, 0))):
        with Locations((-10, -10), (0, 0), (-10, 10), (10, 10), (10, -10)):
            Hole(M4_CLEARANCE_HOLE2_D / 2, depth=M4_CLEARANCE_HOLE2_DEPTH)


solid = part.part
